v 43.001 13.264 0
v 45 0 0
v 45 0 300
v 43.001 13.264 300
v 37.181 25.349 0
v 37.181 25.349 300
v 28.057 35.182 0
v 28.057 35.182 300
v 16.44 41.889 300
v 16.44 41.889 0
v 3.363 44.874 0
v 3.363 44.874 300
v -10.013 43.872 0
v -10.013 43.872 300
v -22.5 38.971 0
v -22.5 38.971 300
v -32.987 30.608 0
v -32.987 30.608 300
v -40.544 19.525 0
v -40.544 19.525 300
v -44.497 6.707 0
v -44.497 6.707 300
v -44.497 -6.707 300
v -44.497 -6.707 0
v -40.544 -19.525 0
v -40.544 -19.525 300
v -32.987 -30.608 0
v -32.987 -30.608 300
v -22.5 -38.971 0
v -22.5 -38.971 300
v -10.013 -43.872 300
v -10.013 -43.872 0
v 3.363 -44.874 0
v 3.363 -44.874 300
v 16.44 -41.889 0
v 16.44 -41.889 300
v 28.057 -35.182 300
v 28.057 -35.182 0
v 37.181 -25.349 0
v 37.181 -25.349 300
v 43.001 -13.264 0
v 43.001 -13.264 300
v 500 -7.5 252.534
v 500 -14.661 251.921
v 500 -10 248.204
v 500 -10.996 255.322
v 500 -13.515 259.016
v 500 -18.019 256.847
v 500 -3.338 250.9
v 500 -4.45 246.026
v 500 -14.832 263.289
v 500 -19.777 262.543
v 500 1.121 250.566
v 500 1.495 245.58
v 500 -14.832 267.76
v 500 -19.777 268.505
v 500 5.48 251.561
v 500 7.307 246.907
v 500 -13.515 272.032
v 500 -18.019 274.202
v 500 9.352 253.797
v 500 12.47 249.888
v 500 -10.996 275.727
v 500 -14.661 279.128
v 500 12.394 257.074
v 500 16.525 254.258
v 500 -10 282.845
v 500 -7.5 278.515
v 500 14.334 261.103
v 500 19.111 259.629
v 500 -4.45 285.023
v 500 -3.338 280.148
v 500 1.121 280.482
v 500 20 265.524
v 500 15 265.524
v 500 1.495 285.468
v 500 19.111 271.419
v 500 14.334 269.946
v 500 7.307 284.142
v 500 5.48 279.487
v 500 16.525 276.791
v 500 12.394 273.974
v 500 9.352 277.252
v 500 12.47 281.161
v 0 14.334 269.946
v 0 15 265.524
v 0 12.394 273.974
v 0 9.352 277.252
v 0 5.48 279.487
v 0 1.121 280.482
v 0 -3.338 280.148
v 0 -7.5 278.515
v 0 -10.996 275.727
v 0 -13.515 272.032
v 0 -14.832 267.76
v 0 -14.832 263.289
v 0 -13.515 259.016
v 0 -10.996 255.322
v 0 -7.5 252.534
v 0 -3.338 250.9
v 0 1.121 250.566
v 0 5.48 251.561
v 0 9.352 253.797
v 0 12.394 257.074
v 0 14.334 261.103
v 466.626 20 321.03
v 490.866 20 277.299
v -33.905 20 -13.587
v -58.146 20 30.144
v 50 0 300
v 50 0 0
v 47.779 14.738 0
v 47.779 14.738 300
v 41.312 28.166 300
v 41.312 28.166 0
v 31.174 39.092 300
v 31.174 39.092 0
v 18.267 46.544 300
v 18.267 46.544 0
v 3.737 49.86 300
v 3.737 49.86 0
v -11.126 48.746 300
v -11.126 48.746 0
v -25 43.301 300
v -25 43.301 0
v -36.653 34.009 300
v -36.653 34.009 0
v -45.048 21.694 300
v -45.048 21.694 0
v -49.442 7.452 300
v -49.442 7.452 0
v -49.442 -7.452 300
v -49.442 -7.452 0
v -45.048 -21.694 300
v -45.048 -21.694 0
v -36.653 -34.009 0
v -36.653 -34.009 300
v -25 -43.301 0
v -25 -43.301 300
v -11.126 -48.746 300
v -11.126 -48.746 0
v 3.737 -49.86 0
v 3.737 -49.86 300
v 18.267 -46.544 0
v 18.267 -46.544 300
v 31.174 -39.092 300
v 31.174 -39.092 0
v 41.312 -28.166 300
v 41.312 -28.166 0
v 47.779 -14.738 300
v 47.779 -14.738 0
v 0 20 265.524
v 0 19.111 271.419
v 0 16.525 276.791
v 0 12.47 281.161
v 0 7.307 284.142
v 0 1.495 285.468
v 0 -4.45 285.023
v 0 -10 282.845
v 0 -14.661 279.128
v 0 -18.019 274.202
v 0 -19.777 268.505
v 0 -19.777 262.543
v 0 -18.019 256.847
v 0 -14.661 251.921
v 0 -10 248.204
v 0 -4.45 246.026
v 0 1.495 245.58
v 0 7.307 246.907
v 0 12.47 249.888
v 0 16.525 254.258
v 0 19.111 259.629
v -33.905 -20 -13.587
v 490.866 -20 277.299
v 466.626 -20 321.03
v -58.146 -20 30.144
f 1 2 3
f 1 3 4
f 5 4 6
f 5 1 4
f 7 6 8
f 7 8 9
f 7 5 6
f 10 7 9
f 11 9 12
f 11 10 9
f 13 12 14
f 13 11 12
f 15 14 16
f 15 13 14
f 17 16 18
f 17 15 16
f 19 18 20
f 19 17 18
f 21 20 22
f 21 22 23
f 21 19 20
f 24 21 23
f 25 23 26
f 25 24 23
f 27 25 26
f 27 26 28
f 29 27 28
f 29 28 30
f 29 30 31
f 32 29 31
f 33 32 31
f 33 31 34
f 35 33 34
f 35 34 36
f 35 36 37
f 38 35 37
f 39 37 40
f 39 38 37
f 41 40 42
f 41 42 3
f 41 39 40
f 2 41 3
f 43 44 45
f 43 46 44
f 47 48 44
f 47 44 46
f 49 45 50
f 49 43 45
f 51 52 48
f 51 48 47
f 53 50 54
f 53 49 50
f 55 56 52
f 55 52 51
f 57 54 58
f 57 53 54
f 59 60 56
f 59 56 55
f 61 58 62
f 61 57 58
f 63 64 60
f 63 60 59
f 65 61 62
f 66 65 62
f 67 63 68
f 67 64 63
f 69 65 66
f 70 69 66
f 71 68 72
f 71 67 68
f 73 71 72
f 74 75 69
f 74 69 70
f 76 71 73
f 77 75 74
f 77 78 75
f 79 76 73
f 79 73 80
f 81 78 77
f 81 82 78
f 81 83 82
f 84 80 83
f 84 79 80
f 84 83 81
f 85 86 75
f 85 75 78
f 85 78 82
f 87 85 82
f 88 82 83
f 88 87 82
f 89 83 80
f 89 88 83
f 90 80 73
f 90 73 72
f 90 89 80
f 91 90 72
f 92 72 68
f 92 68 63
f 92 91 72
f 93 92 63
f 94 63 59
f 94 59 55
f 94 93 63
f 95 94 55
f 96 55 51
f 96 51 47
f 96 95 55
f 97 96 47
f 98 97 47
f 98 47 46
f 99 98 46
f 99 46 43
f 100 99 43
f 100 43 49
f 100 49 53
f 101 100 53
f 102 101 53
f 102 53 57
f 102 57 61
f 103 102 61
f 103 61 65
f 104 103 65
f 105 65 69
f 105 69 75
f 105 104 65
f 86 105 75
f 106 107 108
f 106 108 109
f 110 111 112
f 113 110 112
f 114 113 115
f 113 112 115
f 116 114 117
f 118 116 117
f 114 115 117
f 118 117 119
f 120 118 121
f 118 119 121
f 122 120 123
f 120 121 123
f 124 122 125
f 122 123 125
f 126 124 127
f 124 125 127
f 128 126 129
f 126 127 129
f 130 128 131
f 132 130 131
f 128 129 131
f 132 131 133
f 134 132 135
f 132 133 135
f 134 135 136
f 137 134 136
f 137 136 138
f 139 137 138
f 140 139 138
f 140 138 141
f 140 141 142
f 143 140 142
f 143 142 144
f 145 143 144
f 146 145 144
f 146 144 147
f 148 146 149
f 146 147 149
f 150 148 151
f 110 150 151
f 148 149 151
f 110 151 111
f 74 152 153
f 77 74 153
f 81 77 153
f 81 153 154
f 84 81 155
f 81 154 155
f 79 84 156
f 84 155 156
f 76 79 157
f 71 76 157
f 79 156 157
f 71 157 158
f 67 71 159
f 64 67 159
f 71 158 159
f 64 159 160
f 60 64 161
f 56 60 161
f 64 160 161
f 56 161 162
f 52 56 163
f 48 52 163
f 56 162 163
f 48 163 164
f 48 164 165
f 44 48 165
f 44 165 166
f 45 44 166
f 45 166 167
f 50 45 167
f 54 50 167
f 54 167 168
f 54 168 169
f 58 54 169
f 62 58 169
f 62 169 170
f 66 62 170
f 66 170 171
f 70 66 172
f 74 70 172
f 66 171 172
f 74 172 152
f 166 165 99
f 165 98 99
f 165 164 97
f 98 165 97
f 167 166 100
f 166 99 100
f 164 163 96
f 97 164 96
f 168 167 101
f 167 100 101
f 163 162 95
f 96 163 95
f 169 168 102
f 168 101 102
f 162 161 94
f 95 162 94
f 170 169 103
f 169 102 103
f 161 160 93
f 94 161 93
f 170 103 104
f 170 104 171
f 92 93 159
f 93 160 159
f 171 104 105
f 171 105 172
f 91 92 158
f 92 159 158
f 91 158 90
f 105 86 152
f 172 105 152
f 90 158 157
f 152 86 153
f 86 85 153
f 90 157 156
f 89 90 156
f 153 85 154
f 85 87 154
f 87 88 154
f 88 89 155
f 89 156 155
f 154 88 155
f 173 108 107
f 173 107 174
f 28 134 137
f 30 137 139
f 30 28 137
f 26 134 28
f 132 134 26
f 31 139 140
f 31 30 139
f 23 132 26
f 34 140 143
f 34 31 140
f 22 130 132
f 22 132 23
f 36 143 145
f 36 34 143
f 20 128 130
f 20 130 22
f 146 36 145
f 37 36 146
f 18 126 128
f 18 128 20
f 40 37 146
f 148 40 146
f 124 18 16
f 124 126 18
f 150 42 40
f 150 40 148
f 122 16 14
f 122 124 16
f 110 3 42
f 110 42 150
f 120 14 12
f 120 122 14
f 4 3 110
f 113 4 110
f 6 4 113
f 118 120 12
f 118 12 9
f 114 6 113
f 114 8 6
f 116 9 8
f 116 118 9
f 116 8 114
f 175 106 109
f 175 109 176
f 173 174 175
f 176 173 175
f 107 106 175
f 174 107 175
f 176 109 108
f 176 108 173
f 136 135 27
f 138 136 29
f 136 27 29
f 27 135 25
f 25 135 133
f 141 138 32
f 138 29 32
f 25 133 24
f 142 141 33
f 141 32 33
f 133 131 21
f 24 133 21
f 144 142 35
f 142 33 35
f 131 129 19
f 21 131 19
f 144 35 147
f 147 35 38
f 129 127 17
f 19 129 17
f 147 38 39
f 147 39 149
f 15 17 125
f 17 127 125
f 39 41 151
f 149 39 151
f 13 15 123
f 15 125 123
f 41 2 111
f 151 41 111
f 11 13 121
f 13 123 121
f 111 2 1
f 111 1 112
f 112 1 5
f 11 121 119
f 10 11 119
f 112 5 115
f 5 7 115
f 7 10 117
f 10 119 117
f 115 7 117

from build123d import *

# Parameters (mm, degrees)
F0_R     = 50
F0_R_2   = 45
F1_DEPTH = 300
F5_W     = 40
F5_H     = 50
F6_DEPTH = 600
F7_R     = 20
F7_R_2   = 15
F8_DEPTH = 500


with BuildPart() as f1:
    # F0 (on Top) → F1 (new body)
    with BuildSketch(Plane.XY):
        Circle(F0_R)
        Circle(F0_R_2, mode=Mode.SUBTRACT)
    extrude(amount=F1_DEPTH)


with BuildPart() as f6:
    # F5 (on face) → F6 (new body)
    with BuildSketch(Plane(origin=(-31.697484, 0, -17.570202), x_dir=(0, -1, 0), z_dir=(-0.87462, 0, -0.48481))):
        with Locations((0, 29.554279)):
            Rectangle(F5_W, F5_H)
    extrude(amount=-F6_DEPTH)


with BuildPart() as f8:
    # F7 (on Right) → F8 (new body)
    with BuildSketch(Plane.YZ):
        with Locations((0, 265.524238)):
            Circle(F7_R)
        with Locations((0, 265.524238)):
            Circle(F7_R_2, mode=Mode.SUBTRACT)
    extrude(amount=F8_DEPTH)


solid = Compound([f1.part, f6.part, f8.part])
